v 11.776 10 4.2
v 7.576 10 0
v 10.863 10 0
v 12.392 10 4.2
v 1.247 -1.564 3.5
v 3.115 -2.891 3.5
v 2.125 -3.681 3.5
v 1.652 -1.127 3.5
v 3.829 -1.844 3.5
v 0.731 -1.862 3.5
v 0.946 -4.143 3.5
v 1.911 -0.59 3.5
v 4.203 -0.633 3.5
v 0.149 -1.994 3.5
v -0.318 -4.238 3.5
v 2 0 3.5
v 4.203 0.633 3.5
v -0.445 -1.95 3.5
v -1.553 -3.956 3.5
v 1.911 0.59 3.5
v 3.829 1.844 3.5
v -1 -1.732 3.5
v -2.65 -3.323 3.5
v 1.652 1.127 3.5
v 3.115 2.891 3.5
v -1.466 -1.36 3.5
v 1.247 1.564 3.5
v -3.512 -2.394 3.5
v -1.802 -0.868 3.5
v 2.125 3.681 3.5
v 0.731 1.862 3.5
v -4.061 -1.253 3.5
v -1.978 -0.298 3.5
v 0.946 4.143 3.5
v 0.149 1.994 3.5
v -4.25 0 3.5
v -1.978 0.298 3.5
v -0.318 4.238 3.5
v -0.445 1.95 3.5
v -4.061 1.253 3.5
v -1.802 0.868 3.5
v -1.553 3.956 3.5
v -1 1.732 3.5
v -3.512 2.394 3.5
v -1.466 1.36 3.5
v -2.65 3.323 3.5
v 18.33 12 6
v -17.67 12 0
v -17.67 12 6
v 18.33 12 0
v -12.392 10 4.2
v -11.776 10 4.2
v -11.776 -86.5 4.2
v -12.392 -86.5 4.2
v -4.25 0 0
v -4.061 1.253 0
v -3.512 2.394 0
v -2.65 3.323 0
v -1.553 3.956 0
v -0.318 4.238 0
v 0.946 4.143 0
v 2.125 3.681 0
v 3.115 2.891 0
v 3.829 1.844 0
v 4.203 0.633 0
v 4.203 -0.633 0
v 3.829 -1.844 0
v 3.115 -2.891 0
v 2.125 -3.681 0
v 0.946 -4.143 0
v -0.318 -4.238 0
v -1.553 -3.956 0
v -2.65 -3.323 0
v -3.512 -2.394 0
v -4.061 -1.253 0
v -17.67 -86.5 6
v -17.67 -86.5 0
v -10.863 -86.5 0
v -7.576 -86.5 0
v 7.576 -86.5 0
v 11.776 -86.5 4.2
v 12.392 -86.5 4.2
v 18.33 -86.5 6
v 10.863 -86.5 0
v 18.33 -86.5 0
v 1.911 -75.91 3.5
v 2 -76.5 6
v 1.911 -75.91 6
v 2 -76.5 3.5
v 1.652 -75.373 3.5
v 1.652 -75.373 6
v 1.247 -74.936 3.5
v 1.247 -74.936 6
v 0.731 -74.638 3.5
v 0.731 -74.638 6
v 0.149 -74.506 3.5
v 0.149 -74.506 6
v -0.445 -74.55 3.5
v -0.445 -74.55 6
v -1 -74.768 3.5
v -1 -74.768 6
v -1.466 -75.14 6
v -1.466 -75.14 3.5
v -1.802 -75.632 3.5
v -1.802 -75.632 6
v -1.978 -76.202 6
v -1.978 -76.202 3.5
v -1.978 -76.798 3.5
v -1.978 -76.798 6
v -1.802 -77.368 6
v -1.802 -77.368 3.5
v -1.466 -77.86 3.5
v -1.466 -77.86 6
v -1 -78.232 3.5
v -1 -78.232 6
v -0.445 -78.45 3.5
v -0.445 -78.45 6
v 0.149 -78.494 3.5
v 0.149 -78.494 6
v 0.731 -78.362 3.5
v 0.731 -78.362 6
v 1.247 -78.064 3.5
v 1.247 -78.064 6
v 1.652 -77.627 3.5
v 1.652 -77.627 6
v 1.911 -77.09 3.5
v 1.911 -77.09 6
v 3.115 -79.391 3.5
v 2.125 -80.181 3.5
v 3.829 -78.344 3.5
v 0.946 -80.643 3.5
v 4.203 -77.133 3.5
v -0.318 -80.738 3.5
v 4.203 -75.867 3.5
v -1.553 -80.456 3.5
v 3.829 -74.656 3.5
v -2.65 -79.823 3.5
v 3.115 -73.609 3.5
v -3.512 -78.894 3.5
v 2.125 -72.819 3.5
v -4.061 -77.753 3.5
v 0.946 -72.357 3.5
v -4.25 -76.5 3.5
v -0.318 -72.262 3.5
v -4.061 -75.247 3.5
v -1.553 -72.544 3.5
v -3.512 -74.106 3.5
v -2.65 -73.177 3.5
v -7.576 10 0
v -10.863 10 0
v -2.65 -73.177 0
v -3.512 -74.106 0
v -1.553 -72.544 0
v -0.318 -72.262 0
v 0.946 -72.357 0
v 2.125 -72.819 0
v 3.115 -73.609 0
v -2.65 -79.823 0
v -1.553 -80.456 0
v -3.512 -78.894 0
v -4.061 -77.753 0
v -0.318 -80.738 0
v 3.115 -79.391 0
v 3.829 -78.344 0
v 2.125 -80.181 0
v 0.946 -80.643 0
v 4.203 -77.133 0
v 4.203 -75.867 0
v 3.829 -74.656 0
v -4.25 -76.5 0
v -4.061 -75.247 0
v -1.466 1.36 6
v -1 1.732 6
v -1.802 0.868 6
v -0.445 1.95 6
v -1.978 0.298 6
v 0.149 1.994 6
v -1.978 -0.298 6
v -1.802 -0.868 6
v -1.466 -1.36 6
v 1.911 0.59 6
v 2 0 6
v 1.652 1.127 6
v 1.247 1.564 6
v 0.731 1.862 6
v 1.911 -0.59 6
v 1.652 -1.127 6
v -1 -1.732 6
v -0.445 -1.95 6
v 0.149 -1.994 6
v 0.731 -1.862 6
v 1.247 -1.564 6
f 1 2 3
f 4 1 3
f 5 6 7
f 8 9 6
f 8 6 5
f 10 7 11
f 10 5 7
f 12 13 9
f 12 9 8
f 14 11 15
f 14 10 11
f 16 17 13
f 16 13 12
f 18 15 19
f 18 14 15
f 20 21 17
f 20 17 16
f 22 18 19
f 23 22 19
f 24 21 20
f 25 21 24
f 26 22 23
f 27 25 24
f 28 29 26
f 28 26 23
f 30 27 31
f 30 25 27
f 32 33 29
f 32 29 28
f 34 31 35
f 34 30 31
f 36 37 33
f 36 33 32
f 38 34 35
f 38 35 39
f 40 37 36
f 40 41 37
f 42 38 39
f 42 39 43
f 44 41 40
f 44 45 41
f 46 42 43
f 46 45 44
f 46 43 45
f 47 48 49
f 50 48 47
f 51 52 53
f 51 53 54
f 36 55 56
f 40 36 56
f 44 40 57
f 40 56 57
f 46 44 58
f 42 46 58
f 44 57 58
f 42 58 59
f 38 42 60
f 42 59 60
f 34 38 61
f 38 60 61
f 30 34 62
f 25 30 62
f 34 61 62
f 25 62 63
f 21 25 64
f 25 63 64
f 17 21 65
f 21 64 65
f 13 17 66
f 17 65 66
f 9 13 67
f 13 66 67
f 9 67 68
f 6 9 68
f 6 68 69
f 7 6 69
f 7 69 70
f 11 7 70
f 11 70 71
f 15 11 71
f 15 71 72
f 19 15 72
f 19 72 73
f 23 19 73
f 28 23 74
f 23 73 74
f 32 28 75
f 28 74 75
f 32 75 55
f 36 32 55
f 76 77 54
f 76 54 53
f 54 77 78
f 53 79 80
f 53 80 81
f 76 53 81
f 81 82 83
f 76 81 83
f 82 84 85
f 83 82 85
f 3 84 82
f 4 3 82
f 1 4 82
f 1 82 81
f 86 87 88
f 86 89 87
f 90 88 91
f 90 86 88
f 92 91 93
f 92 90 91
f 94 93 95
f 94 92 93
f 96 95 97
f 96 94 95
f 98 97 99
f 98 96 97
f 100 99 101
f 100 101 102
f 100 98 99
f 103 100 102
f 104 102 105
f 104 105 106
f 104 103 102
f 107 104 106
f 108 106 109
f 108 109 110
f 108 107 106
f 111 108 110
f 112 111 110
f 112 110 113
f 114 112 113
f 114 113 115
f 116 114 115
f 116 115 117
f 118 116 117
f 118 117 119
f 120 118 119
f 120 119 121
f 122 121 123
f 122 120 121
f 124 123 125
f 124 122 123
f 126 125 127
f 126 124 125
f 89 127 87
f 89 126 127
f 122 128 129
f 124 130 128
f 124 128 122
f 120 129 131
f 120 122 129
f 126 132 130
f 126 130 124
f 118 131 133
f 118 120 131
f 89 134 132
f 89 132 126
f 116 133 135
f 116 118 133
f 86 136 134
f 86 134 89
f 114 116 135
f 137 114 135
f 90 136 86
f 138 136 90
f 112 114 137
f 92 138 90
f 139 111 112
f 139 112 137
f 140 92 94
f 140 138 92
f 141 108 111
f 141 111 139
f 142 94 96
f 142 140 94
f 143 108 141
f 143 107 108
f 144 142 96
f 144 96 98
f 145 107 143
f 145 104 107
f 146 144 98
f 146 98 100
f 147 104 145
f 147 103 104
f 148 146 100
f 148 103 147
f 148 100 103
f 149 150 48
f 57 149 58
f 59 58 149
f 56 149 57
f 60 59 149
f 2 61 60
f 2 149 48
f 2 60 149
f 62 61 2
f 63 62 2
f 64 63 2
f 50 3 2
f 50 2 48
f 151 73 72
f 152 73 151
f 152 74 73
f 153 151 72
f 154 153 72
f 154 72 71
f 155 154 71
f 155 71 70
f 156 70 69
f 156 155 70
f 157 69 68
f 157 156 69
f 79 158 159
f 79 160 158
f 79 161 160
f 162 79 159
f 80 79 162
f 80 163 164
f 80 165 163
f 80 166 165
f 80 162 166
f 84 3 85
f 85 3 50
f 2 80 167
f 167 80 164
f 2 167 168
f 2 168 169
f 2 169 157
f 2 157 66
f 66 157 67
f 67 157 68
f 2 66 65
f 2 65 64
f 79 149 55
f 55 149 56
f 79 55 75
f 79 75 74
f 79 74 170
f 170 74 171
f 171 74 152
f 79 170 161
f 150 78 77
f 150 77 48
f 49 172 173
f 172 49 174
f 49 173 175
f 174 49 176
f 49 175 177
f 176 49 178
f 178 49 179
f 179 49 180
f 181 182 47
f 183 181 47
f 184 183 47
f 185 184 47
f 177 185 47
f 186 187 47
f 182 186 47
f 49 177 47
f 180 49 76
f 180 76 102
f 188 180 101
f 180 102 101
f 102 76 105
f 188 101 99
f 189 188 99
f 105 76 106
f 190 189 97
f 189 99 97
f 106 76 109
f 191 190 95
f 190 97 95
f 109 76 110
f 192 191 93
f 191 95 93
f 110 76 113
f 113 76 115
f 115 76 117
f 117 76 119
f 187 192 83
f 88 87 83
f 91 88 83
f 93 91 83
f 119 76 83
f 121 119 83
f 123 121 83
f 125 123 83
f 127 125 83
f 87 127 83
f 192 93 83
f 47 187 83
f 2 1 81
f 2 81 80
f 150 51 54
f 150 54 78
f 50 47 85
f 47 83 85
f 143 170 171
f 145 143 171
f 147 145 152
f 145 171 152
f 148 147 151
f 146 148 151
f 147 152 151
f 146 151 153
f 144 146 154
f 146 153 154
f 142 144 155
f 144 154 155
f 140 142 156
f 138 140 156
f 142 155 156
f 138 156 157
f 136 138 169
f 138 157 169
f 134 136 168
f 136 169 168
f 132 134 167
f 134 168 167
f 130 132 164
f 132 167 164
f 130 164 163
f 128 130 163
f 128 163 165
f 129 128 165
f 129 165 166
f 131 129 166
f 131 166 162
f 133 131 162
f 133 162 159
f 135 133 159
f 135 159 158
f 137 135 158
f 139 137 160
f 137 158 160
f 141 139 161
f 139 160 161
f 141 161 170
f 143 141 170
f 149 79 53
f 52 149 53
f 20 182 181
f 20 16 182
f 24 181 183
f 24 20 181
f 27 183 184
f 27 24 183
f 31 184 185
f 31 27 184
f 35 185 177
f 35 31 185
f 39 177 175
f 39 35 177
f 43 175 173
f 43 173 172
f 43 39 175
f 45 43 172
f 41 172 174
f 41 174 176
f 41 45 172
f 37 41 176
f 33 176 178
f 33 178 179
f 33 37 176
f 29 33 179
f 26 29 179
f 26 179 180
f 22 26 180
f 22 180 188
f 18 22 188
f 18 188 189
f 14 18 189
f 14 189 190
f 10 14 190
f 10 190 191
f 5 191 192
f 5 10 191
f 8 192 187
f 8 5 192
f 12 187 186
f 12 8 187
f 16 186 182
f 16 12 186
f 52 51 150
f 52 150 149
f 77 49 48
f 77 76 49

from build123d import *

# Parameters (mm, degrees)
SKETCH1_W           = 40
SKETCH1_H           = 96.5
BOSS_EXTRUDE1_DEPTH = 4
CUT_EXTRUDE3_DEPTH  = 20
SKETCH5_R           = 2
CUT_EXTRUDE5_DEPTH  = 10
SKETCH6_W           = 2
SKETCH6_H           = 96.5
CUT_EXTRUDE6_DEPTH  = 10
SKETCH7_W           = 36
SKETCH7_H           = 96.5
SKETCH7_R           = 2
BOSS_EXTRUDE2_DEPTH = 2
CUT_EXTRUDE7_DEPTH  = 97.5
SKETCH8_R           = 4.25
SKETCH8_R_2         = 2
CUT_EXTRUDE8_DEPTH  = 3.5
CUT_EXTRUDE10_DEPTH = 122
SKETCH10_W          = 36
SKETCH10_H          = 6
BOSS_EXTRUDE3_DEPTH = 2


with BuildPart() as part:
    # Sketch1 → Boss-Extrude1 (new body)
    with BuildSketch(Plane.XY):
        with Locations((0.330243162, -38.25)):
            Rectangle(SKETCH1_W, SKETCH1_H)
    extrude(amount=BOSS_EXTRUDE1_DEPTH)

    # Sketch3 → Cut-Extrude3 (cut)
    with BuildSketch(Plane.XZ.offset(86.5)):
        Polygon((-12.106417754, 4), (-10.650536835, 0), (-7.858578609, 0), (-11.858578609, 4), align=None)
        Polygon((11.858580346, 4), (7.858579777, 0), (10.650537342, 0), (12.106418599, 4), align=None)
    extrude(amount=-CUT_EXTRUDE3_DEPTH, mode=Mode.SUBTRACT)

    # Sketch5 → Cut-Extrude5 (cut)
    with BuildSketch(Plane.XY.offset(4)):
        Circle(SKETCH5_R)
        with Locations((0, -76.5)):
            Circle(SKETCH5_R)
    extrude(amount=-CUT_EXTRUDE5_DEPTH, mode=Mode.SUBTRACT)

    # Sketch6 → Cut-Extrude6 (cut)
    with BuildSketch(Plane.XY.offset(4)):
        with Locations((-18.669756838, -38.25)):
            Rectangle(SKETCH6_W, SKETCH6_H)
        with Locations((19.330243162, -38.25)):
            Rectangle(SKETCH6_W, SKETCH6_H)
    extrude(amount=-CUT_EXTRUDE6_DEPTH, mode=Mode.SUBTRACT)

    # Sketch7 → Boss-Extrude2 (add)
    with BuildSketch(Plane.XY.offset(4)):
        with Locations((0.330243162, -38.25)):
            Rectangle(SKETCH7_W, SKETCH7_H)
        with Locations((0, -76.5)):
            Circle(SKETCH7_R, mode=Mode.SUBTRACT)
        Circle(SKETCH7_R, mode=Mode.SUBTRACT)
    extrude(amount=BOSS_EXTRUDE2_DEPTH)

    # Sketch4 → Cut-Extrude7 (cut, through all)
    with BuildSketch(Plane(origin=(0, 10, 0), x_dir=(1, 0, 0), z_dir=(0, 1, 0))):
        Polygon((-11.858578609, -4), (-7.858578609, 0), (-10.650536835, 0), (-12.106417754, -4), align=None)
        Polygon((10.650537342, 0), (7.858579777, 0), (11.858580346, -4), (12.106418599, -4), align=None)
    extrude(amount=-CUT_EXTRUDE7_DEPTH, mode=Mode.SUBTRACT)

    # Sketch8 → Cut-Extrude8 (cut)
    with BuildSketch(Plane(origin=(0, 0, 0), x_dir=(-1, 0, 0), z_dir=(0, 0, -1))):
        Circle(SKETCH8_R)
        Circle(SKETCH8_R_2, mode=Mode.SUBTRACT)
        with Locations((0, -76.5)):
            Circle(SKETCH8_R)
        with Locations((0, -76.5)):
            Circle(SKETCH8_R_2, mode=Mode.SUBTRACT)
    extrude(amount=-CUT_EXTRUDE8_DEPTH, mode=Mode.SUBTRACT)

    # Sketch9 → Cut-Extrude10 (cut)
    with BuildSketch(Plane(origin=(0, 10, 0), x_dir=(1, 0, 0), z_dir=(0, 1, 0))):
        Polygon((-10.790578344, 0.2), (-7.375735897, 0.2), (-11.775735897, -4.2), (-12.392047354, -4.2), align=None)
        Polygon((7.375737016, 0.2), (10.790578839, 0.2), (12.392048222, -4.2), (11.775737642, -4.2), align=None)
    extrude(amount=-CUT_EXTRUDE10_DEPTH, mode=Mode.SUBTRACT)

    # Sketch10 → Boss-Extrude3 (add)
    with BuildSketch(Plane(origin=(0, 10, 0), x_dir=(1, 0, 0), z_dir=(0, 1, 0))):
        with Locations((0.330243162, -3)):
            Rectangle(SKETCH10_W, SKETCH10_H)
    extrude(amount=BOSS_EXTRUDE3_DEPTH)


solid = part.part
